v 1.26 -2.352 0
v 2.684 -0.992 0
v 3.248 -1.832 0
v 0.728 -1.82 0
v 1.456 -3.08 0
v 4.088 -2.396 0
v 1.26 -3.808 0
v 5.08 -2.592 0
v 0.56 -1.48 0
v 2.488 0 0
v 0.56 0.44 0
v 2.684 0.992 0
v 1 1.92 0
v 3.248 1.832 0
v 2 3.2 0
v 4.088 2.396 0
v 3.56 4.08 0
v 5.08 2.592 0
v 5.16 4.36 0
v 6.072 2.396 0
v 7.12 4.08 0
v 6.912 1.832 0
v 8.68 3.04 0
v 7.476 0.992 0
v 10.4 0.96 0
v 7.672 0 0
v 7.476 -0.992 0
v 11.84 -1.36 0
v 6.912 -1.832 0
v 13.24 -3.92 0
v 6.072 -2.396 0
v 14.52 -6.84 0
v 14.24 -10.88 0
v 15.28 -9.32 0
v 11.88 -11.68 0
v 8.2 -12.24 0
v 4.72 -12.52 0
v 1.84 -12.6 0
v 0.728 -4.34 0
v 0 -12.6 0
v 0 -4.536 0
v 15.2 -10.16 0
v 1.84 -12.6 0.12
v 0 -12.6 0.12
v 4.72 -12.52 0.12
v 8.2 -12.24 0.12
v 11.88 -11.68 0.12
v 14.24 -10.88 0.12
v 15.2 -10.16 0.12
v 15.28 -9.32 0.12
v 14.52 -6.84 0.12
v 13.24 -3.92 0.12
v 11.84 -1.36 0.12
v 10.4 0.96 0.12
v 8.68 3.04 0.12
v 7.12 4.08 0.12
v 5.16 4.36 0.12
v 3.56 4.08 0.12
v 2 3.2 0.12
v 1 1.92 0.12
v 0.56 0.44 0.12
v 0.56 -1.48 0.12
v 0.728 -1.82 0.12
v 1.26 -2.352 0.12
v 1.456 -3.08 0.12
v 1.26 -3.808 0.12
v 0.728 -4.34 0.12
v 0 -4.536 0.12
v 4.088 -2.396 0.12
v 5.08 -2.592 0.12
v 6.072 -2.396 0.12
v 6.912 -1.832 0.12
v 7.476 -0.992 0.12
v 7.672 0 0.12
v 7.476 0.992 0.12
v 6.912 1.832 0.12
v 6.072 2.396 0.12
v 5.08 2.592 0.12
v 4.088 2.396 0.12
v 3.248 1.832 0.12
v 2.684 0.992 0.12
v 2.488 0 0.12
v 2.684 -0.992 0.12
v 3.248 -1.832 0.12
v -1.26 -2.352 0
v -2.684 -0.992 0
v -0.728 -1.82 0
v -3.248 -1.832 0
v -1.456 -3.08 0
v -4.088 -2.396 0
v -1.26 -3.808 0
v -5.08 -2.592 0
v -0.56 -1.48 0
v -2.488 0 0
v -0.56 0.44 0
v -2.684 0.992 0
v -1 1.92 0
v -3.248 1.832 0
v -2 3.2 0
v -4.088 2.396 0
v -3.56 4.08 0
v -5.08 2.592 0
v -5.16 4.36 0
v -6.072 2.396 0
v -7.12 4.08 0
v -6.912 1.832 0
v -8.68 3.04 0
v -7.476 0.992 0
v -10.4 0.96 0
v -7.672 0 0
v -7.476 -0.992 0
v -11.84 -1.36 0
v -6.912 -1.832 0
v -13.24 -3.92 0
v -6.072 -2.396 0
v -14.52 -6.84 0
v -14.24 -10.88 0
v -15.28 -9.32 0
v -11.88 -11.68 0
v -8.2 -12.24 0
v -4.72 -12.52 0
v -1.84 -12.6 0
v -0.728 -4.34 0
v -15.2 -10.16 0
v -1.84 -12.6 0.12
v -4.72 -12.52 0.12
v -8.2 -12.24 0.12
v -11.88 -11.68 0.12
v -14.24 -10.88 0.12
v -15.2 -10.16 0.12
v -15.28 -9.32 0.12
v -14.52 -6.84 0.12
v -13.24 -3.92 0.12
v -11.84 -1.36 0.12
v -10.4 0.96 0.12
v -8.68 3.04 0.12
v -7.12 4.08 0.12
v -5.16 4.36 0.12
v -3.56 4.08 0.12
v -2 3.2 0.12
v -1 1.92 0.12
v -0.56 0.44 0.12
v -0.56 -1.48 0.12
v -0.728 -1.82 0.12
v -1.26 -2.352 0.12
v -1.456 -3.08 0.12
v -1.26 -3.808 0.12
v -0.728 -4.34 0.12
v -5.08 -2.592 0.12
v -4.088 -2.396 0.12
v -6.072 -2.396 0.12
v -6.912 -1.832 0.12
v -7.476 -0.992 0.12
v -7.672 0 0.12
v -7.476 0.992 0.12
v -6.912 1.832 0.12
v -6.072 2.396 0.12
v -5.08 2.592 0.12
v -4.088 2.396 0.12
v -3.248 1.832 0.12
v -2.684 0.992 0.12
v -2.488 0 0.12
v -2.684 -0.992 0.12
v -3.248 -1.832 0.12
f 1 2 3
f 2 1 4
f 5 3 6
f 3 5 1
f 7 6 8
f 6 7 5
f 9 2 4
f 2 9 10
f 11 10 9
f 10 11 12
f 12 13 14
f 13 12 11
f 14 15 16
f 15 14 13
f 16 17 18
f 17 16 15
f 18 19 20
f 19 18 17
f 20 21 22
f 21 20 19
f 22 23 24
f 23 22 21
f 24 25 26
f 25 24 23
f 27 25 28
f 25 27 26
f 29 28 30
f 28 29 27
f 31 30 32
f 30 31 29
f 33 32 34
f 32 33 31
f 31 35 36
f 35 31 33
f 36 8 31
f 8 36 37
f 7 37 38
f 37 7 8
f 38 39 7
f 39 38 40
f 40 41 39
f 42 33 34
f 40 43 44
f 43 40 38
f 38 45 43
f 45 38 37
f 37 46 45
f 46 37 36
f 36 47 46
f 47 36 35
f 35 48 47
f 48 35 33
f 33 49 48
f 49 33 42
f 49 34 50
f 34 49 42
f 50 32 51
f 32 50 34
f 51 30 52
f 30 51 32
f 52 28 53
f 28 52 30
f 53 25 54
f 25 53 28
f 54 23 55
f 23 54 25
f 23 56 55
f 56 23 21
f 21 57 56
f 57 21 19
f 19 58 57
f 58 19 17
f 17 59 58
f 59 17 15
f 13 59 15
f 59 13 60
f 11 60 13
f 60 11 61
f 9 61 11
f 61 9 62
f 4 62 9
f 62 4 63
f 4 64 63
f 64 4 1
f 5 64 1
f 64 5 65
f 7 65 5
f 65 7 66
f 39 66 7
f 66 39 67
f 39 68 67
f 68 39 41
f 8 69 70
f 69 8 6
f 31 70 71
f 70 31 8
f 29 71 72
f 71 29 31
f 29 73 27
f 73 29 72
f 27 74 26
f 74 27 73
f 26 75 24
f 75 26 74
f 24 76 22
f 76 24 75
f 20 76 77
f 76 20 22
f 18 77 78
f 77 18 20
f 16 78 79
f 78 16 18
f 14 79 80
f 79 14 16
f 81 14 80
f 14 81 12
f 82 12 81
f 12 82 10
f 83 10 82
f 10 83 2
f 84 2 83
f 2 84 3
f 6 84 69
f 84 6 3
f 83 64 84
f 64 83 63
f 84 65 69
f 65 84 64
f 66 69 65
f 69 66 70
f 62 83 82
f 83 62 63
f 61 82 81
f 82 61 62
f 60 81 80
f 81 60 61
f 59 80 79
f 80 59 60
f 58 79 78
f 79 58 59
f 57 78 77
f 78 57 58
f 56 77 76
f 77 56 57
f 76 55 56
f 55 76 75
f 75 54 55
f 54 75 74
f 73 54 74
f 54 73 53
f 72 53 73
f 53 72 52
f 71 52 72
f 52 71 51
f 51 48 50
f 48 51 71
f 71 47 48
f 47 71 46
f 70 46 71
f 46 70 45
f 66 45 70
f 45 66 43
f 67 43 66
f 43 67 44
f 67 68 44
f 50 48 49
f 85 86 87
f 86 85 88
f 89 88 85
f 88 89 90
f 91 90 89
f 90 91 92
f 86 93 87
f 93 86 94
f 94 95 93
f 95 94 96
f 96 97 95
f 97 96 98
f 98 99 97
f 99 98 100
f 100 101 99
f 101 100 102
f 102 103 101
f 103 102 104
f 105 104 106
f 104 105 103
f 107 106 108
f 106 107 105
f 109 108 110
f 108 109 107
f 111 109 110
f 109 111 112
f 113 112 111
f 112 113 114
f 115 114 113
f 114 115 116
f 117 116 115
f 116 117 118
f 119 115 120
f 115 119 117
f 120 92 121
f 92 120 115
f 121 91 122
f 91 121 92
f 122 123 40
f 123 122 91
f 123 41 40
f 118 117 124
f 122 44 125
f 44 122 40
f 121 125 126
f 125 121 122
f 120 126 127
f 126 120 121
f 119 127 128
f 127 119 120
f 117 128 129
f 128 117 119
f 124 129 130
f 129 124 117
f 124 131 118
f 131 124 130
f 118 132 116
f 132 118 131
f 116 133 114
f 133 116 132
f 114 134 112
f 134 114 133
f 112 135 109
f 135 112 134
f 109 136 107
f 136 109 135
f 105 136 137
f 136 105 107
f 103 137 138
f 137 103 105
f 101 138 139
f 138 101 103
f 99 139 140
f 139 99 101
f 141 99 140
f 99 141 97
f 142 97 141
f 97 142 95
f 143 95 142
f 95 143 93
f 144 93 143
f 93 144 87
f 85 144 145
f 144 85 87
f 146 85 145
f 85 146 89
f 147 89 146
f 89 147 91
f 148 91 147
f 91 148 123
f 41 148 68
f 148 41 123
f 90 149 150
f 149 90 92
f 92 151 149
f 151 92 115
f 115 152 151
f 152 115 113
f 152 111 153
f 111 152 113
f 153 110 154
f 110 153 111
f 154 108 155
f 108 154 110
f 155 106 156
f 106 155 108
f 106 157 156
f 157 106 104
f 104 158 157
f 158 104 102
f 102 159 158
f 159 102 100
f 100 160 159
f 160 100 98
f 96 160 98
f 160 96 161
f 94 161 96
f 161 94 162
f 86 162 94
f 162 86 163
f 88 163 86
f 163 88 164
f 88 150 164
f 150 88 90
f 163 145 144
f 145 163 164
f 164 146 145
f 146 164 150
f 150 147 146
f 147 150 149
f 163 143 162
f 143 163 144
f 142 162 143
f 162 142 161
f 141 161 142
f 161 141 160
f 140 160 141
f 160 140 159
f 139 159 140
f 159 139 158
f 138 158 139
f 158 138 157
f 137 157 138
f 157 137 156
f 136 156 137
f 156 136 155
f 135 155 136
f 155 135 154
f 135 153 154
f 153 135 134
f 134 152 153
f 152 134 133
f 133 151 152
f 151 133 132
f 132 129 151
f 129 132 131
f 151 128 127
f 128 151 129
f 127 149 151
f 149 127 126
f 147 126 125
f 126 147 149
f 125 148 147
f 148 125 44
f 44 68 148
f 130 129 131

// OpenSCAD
// file: s/20551s01.scad
use <../../lib.scad>
function ldraw_lib__s__20551s01() = [
// 0 ~Minifig Cape Cloth High Rounded Collar Surface - Half
// 0 Name: s\20551s01.dat
// 0 Author: Philippe Hurbain [Philo]
// 0 !LDRAW_ORG Subpart UPDATE 2020-03
// 0 !LICENSE Licensed under CC BY 2.0 and CC BY 4.0 : see CAreadme.txt
// 
// 0 BFC CERTIFY CCW
  [0,"BFC","CERTIFY"],
  [0,"BFC","CCW"],
// 
// 0 !HISTORY 2020-12-29 [PTadmin] Official Update 2020-03
// 
// 
// 4 16 8.12 0 -4.58 6.71 0 -2.48 1.82 0 -4.55 3.15 0 -5.88
  [4,16,8.12,0,-4.58,6.71,0,-2.48,1.82,0,-4.55,3.15,0,-5.88],
// 4 16 10.22 0 -5.99 8.12 0 -4.58 3.15 0 -5.88 3.64 0 -7.7
  [4,16,10.22,0,-5.99,8.12,0,-4.58,3.15,0,-5.88,3.64,0,-7.7],
// 4 16 12.7 0 -6.48 10.22 0 -5.99 3.64 0 -7.7 3.15 0 -9.52
  [4,16,12.7,0,-6.48,10.22,0,-5.99,3.64,0,-7.7,3.15,0,-9.52],
// 4 16 1.4 0 -3.7 1.82 0 -4.55 6.71 0 -2.48 6.22 0 0
  [4,16,1.4,0,-3.7,1.82,0,-4.55,6.71,0,-2.48,6.22,0,0],
// 4 16 1.4 0 1.1 1.4 0 -3.7 6.22 0 0 6.71 0 2.48
  [4,16,1.4,0,1.1,1.4,0,-3.7,6.22,0,0,6.71,0,2.48],
// 4 16 2.5 0 4.8 1.4 0 1.1 6.71 0 2.48 8.12 0 4.58
  [4,16,2.5,0,4.8,1.4,0,1.1,6.71,0,2.48,8.12,0,4.58],
// 4 16 5 0 8 2.5 0 4.8 8.12 0 4.58 10.22 0 5.99
  [4,16,5,0,8,2.5,0,4.8,8.12,0,4.58,10.22,0,5.99],
// 4 16 8.9 0 10.2 5 0 8 10.22 0 5.99 12.7 0 6.48
  [4,16,8.9,0,10.2,5,0,8,10.22,0,5.99,12.7,0,6.48],
// 4 16 12.9 0 10.9 8.9 0 10.2 12.7 0 6.48 15.18 0 5.99
  [4,16,12.9,0,10.9,8.9,0,10.2,12.7,0,6.48,15.18,0,5.99],
// 4 16 17.8 0 10.2 12.9 0 10.9 15.18 0 5.99 17.28 0 4.58
  [4,16,17.8,0,10.2,12.9,0,10.9,15.18,0,5.99,17.28,0,4.58],
// 4 16 21.7 0 7.6 17.8 0 10.2 17.28 0 4.58 18.69 0 2.48
  [4,16,21.7,0,7.6,17.8,0,10.2,17.28,0,4.58,18.69,0,2.48],
// 4 16 26 0 2.4 21.7 0 7.6 18.69 0 2.48 19.18 0 0
  [4,16,26,0,2.4,21.7,0,7.6,18.69,0,2.48,19.18,0,0],
// 4 16 29.6 0 -3.4 26 0 2.4 19.18 0 0 18.69 0 -2.48
  [4,16,29.6,0,-3.4,26,0,2.4,19.18,0,0,18.69,0,-2.48],
// 4 16 33.1 0 -9.8 29.6 0 -3.4 18.69 0 -2.48 17.28 0 -4.58
  [4,16,33.1,0,-9.8,29.6,0,-3.4,18.69,0,-2.48,17.28,0,-4.58],
// 4 16 36.3 0 -17.1 33.1 0 -9.8 17.28 0 -4.58 15.18 0 -5.99
  [4,16,36.3,0,-17.1,33.1,0,-9.8,17.28,0,-4.58,15.18,0,-5.99],
// 4 16 38.2 0 -23.3 36.3 0 -17.1 15.18 0 -5.99 35.6 0 -27.2
  [4,16,38.2,0,-23.3,36.3,0,-17.1,15.18,0,-5.99,35.6,0,-27.2],
// 4 16 29.7 0 -29.2 35.6 0 -27.2 15.18 0 -5.99 20.5 0 -30.6
  [4,16,29.7,0,-29.2,35.6,0,-27.2,15.18,0,-5.99,20.5,0,-30.6],
// 4 16 20.5 0 -30.6 15.18 0 -5.99 12.7 0 -6.48 11.8 0 -31.3
  [4,16,20.5,0,-30.6,15.18,0,-5.99,12.7,0,-6.48,11.8,0,-31.3],
// 4 16 11.8 0 -31.3 12.7 0 -6.48 3.15 0 -9.52 4.6 0 -31.5
  [4,16,11.8,0,-31.3,12.7,0,-6.48,3.15,0,-9.52,4.6,0,-31.5],
// 4 16 4.6 0 -31.5 3.15 0 -9.52 1.82 0 -10.85 0 0 -31.5
  [4,16,4.6,0,-31.5,3.15,0,-9.52,1.82,0,-10.85,0,0,-31.5],
// 3 16 1.82 0 -10.85 0 0 -11.34 0 0 -31.5
  [3,16,1.82,0,-10.85,0,0,-11.34,0,0,-31.5],
// 3 16 38.2 0 -23.3 35.6 0 -27.2 38 0 -25.4
  [3,16,38.2,0,-23.3,35.6,0,-27.2,38,0,-25.4],
];
makepoly(ldraw_lib__s__20551s01(), line=0.2);
// main file
use <../lib.scad>
use <s/20551s01.scad>
use <s/20551s02.scad>
function ldraw_lib__20551() = [
// 0 Minifig Cape Cloth High Rounded Collar
// 0 Name: 20551.dat
// 0 Author: Philippe Hurbain [Philo]
// 0 !LDRAW_ORG Part UPDATE 2020-03
// 0 !LICENSE Licensed under CC BY 2.0 and CC BY 4.0 : see CAreadme.txt
// 
// 0 BFC CERTIFY CCW
  [0,"BFC","CERTIFY"],
  [0,"BFC","CCW"],
// 
// 0 !CATEGORY Sheet Fabric
// 0 !KEYWORDS Cloak, Neckwear
// 
// 0 !HISTORY 2020-12-29 [PTadmin] Official Update 2020-03
// 
// 
// 1 16 0 0 0 1 0 0 0 -1 0 0 0 1 s\20551s01.dat
  [1,16,0,0,0,1,0,0,0,-1,0,0,0,1, ldraw_lib__s__20551s01()],
// 1 16 0 0 0 1 0 0 0 1 0 0 0 1 s\20551s02.dat
  [1,16,0,0,0,1,0,0,0,1,0,0,0,1, ldraw_lib__s__20551s02()],
// 1 16 0 -.3 0 1 0 0 0 1 0 0 0 1 s\20551s01.dat
  [1,16,0,-.3,0,1,0,0,0,1,0,0,0,1, ldraw_lib__s__20551s01()],
// 1 16 0 0 0 -1 0 0 0 -1 0 0 0 1 s\20551s01.dat
  [1,16,0,0,0,-1,0,0,0,-1,0,0,0,1, ldraw_lib__s__20551s01()],
// 1 16 0 0 0 -1 0 0 0 1 0 0 0 1 s\20551s02.dat
  [1,16,0,0,0,-1,0,0,0,1,0,0,0,1, ldraw_lib__s__20551s02()],
// 1 16 0 -.3 0 -1 0 0 0 1 0 0 0 1 s\20551s01.dat
  [1,16,0,-.3,0,-1,0,0,0,1,0,0,0,1, ldraw_lib__s__20551s01()],
];
makepoly(ldraw_lib__20551(), line=0.2);
